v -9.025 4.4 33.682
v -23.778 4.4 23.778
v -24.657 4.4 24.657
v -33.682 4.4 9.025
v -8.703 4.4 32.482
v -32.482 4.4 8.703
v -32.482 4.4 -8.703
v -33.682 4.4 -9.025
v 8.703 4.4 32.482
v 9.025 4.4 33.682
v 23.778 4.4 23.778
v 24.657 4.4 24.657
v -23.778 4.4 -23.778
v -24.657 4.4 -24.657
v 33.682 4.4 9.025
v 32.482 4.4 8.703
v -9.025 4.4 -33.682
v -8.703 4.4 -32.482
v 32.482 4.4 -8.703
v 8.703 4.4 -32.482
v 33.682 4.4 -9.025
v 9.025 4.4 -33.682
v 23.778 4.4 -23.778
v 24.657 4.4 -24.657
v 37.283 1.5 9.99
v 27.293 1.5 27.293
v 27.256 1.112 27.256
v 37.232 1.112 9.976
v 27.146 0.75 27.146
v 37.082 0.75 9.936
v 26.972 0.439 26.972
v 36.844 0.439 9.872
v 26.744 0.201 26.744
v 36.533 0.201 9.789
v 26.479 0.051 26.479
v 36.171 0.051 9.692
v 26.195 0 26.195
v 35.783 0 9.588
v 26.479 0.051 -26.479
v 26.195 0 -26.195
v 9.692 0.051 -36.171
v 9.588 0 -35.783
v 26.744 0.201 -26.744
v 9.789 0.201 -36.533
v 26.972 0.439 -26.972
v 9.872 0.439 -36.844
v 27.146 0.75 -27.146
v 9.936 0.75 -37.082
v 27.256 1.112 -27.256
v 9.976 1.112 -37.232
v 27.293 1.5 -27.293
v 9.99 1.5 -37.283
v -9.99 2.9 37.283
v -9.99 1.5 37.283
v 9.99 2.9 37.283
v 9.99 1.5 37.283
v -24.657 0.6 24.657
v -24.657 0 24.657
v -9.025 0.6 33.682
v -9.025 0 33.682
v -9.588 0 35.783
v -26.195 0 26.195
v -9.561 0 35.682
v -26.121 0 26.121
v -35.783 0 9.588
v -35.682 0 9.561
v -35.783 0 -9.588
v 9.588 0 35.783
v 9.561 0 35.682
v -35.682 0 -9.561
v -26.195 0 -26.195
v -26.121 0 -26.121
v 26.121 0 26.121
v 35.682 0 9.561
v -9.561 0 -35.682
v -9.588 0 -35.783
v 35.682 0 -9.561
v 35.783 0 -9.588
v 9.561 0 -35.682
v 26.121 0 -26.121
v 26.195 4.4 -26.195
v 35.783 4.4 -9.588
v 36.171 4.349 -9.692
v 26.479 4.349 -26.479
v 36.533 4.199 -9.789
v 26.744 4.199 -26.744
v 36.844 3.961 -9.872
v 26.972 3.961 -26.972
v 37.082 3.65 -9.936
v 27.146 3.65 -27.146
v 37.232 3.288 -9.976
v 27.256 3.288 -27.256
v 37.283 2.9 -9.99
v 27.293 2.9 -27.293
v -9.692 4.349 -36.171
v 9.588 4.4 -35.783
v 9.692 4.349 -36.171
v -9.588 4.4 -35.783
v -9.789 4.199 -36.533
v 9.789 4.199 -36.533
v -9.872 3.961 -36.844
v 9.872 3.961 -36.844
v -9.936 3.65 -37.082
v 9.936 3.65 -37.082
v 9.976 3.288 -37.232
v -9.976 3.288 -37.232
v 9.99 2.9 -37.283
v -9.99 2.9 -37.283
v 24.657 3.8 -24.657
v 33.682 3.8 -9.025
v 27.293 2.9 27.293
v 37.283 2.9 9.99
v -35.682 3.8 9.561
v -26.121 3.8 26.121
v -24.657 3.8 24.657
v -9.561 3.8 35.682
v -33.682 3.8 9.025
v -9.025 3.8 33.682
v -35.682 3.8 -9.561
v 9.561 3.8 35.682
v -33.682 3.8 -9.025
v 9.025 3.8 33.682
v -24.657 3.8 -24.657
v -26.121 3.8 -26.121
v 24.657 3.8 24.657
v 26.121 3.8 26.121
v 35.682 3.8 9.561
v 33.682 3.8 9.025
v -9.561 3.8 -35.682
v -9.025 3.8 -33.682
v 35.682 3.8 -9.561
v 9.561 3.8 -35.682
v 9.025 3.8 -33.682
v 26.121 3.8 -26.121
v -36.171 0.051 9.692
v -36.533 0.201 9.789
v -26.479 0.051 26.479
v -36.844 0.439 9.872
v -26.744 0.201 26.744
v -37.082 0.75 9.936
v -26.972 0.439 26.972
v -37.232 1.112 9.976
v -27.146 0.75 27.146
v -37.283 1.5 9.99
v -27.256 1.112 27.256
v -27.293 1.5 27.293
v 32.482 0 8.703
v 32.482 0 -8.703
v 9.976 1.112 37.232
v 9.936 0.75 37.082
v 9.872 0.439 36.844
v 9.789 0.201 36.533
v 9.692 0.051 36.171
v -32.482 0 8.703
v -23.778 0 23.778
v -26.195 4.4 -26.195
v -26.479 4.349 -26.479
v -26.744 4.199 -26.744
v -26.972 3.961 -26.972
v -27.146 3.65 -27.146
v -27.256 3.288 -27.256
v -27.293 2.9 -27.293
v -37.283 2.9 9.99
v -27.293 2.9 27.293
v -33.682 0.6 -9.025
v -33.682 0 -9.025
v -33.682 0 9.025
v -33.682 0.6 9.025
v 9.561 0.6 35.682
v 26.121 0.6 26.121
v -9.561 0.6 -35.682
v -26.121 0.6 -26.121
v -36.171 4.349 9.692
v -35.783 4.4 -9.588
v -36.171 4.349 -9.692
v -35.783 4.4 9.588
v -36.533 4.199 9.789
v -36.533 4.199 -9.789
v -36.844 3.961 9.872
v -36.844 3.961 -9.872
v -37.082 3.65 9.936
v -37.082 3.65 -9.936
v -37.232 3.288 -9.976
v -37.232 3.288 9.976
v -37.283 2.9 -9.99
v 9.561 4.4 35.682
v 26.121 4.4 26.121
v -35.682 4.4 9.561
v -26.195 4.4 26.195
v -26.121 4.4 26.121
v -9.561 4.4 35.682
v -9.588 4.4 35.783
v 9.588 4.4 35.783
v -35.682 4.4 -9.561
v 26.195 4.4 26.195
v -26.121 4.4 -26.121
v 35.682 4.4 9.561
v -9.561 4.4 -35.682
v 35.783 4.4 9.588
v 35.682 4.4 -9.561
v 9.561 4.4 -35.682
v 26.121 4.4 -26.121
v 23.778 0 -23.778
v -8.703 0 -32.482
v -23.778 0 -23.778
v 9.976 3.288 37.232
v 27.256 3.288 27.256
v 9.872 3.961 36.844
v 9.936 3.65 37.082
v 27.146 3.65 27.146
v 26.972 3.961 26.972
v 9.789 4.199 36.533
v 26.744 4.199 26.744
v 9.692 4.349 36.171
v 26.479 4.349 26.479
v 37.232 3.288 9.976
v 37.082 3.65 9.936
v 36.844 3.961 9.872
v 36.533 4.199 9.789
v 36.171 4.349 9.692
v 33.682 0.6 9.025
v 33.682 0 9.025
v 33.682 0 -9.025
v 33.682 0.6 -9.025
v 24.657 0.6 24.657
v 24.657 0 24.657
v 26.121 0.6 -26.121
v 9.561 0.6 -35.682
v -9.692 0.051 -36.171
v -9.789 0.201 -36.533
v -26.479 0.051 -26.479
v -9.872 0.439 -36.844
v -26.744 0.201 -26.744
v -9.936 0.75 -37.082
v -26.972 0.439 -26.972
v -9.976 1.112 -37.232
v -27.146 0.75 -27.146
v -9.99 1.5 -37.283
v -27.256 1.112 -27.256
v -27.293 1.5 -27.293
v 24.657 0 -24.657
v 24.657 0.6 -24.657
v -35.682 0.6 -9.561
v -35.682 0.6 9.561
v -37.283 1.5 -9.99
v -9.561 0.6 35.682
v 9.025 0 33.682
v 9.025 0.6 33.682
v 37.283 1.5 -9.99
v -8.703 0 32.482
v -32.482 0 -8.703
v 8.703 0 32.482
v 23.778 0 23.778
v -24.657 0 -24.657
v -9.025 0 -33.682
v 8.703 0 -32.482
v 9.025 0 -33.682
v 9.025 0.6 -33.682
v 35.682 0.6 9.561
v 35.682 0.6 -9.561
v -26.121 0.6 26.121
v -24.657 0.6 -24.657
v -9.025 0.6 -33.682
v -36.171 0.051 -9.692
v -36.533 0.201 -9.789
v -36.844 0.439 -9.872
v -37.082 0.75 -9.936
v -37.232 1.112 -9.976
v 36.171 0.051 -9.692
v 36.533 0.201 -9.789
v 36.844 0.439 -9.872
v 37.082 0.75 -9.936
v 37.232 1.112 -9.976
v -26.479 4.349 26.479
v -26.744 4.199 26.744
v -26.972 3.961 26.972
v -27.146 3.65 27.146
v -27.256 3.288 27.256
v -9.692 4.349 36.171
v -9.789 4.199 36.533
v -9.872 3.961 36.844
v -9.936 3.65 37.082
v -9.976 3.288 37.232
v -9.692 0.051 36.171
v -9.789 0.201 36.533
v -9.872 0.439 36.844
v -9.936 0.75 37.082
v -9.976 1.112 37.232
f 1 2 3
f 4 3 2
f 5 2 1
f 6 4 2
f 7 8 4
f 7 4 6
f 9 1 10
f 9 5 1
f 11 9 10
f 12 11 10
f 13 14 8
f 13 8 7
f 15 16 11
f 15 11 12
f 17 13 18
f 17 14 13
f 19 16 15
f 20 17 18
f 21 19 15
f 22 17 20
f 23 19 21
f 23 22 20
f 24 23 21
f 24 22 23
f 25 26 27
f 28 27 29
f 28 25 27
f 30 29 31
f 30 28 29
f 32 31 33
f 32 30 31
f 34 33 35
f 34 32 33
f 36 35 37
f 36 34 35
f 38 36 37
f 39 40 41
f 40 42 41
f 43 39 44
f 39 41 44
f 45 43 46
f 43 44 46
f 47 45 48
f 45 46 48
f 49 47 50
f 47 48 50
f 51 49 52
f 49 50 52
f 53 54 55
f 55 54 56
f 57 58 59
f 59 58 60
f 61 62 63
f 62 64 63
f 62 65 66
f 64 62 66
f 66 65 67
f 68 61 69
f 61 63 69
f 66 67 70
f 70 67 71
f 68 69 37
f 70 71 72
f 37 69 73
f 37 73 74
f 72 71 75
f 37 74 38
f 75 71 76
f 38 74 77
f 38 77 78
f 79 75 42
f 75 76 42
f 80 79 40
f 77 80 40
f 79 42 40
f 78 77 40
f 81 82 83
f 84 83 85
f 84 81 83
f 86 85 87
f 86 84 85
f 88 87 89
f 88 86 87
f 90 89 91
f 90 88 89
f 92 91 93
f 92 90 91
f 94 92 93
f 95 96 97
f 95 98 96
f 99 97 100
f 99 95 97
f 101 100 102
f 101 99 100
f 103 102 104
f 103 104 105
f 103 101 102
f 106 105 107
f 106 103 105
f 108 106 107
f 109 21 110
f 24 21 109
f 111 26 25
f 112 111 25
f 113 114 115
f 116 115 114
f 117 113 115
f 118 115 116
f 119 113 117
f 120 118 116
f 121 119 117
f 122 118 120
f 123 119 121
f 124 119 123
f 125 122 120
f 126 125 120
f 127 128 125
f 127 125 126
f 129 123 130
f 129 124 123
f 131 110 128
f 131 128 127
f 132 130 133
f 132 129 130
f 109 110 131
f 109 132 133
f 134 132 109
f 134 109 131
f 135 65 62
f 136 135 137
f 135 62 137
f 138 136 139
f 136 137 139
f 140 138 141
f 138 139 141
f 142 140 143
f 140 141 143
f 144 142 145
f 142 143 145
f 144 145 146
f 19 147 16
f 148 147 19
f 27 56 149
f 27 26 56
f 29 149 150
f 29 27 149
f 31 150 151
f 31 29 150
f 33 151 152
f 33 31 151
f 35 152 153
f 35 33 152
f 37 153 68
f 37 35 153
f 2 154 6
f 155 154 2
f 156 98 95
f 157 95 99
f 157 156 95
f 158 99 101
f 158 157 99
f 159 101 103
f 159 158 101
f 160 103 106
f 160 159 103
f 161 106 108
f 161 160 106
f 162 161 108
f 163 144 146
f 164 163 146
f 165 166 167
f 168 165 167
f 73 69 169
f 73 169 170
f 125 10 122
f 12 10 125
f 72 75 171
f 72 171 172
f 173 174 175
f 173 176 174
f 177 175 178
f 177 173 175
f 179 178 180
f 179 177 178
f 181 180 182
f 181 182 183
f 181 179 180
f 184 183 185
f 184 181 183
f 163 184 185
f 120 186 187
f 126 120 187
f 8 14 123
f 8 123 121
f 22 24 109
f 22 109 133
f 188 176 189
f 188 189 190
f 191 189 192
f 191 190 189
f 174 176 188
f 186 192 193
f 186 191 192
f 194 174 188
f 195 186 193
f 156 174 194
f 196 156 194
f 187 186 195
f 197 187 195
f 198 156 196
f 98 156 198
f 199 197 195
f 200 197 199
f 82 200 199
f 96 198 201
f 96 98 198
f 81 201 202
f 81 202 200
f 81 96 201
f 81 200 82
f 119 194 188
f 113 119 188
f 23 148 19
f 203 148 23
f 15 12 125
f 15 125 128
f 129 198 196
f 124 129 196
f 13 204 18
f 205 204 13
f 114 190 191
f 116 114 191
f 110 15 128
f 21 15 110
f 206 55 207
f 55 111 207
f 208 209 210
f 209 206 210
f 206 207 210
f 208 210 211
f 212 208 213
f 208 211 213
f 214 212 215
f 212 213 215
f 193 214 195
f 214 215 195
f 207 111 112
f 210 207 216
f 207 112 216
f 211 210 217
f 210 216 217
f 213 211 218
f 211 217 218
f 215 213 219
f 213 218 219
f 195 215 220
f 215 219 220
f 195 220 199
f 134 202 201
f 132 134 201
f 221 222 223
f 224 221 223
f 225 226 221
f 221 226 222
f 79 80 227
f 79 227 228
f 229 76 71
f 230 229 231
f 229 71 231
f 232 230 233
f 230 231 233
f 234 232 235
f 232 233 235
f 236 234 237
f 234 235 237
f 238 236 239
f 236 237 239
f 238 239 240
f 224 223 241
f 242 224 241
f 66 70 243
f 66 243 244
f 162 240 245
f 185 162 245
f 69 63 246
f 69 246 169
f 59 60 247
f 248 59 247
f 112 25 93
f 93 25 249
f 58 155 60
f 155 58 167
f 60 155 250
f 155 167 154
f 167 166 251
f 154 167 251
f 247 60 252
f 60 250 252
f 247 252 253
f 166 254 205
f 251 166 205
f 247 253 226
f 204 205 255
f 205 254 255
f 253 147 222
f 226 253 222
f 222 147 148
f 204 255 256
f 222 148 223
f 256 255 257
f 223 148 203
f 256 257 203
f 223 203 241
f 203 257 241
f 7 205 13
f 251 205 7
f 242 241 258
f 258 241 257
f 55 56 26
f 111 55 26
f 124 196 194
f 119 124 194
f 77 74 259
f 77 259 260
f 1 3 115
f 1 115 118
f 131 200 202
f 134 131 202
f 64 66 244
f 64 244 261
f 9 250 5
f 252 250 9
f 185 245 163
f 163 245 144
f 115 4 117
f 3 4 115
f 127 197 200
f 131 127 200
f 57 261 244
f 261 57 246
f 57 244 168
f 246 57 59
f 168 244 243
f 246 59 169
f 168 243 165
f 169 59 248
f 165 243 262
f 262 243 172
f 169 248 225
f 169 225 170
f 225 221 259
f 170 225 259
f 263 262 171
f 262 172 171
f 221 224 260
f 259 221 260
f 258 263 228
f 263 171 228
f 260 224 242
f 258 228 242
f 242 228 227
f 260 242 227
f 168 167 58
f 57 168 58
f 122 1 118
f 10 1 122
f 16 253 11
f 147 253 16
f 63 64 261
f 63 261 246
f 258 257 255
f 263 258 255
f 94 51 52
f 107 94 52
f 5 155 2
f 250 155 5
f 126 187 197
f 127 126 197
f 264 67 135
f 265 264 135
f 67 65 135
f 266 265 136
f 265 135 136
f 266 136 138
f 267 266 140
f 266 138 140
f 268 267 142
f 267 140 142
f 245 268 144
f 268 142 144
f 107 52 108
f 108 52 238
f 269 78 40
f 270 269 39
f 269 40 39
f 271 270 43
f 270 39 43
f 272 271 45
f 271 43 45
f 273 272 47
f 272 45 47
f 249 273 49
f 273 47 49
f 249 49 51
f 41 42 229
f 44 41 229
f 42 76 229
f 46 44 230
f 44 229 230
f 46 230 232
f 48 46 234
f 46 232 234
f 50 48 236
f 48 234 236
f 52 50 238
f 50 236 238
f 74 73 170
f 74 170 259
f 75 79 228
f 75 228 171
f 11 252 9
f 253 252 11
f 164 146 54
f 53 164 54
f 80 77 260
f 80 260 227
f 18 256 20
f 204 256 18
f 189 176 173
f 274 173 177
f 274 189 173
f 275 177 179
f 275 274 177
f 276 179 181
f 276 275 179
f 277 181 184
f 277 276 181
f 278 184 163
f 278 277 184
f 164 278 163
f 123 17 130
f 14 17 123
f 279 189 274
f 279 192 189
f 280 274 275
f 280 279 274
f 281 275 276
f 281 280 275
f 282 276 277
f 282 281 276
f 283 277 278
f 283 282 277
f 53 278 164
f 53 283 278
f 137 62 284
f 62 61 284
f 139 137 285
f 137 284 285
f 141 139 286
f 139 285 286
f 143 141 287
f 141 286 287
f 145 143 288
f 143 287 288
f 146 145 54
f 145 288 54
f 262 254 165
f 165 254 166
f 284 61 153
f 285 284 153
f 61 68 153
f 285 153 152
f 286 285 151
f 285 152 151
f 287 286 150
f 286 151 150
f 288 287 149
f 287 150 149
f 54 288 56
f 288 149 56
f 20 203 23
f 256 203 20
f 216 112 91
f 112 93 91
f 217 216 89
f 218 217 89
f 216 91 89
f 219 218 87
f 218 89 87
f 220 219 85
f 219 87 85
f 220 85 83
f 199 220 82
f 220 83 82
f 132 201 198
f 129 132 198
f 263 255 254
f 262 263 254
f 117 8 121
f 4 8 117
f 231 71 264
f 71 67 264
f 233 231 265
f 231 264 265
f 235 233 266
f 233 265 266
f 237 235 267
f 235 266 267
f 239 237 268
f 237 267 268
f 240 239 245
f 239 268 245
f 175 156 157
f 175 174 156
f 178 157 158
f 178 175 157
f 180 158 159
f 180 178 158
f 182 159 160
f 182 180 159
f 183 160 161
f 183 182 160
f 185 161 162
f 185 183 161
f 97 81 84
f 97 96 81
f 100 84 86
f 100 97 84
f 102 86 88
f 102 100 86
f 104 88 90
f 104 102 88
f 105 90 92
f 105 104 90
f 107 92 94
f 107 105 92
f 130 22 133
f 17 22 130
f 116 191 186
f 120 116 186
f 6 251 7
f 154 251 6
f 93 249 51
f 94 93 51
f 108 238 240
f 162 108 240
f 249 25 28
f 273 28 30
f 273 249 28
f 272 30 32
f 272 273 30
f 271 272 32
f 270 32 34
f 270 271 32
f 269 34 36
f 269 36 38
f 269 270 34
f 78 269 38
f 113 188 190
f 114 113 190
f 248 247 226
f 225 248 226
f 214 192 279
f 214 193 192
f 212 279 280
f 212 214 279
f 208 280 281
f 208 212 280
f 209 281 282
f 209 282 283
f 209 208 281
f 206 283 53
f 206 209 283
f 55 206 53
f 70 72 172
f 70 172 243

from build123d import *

# Parameters (mm, degrees)
EXTRUDE_1_DEPTH          = 4.4
CUT_EXTRUDE_1_DEPTH      = 0.6
FILLET_1_R               = 1.5
CUT_EXTRUDE_2_DEPTH      = 53.909660275
CUT_EXTRUDE_2_DEPTH_BACK = 53.909660275


with BuildPart() as part:
    # 스케치1 → 보스-돌출1 (new body)
    with BuildSketch(Plane(origin=(0, 0, 0), x_dir=(1, 0, 0), z_dir=(0, 1, 0))):
        Polygon((27.293187568, -27.293187568), (37.283187568, -9.99), (37.283187568, 9.99), (27.293187568, 27.293187568), (9.99, 37.283187568), (-9.99, 37.283187568), (-27.293187568, 27.293187568), (-37.283187568, 9.99), (-37.283187568, -9.99), (-27.293187568, -27.293187568), (-9.99, -37.283187568), (9.99, -37.283187568), align=None)
    extrude(amount=EXTRUDE_1_DEPTH)

    # 스케치2 → 컷-돌출1 (cut)
    with BuildSketch(Plane(origin=(0, 4.4, 0), x_dir=(1, 0, 0), z_dir=(0, 1, 0))):
        Polygon((-26.120860153, 26.120860153), (-35.681758538, 9.560898385), (-35.681758538, -9.560898385), (-26.120860153, -26.120860153), (-9.560898385, -35.681758538), (9.560898385, -35.681758538), (26.120860153, -26.120860153), (35.681758538, -9.560898385), (35.681758538, 9.560898385), (26.120860153, 26.120860153), (9.560898385, 35.681758538), (-9.560898385, 35.681758538), align=None)
        Polygon((24.656758538, -24.656758538), (33.681758538, -9.025), (33.681758538, 9.025), (24.656758538, 24.656758538), (9.025, 33.681758538), (-9.025, 33.681758538), (-24.656758538, 24.656758538), (-33.681758538, 9.025), (-33.681758538, -9.025), (-24.656758538, -24.656758538), (-9.025, -33.681758538), (9.025, -33.681758538), align=None, mode=Mode.SUBTRACT)
    cut_extrude_1 = extrude(amount=-CUT_EXTRUDE_1_DEPTH, mode=Mode.SUBTRACT)

    # 필렛1
    fillet_1_edges = [part.edges().sort_by_distance(p)[0] for p in [
        (0, 0, 37.283187568),
        (-18.641593784, 0, 32.288187568),
        (37.283187568, 4.4, 0),
        (-32.288187568, 0, 18.641593784),
        (-37.283187568, 0, 0),
        (-32.288187568, 0, -18.641593784),
        (-18.641593784, 0, -32.288187568),
        (0, 0, -37.283187568),
        (18.641593784, 0, -32.288187568),
        (32.288187568, 0, -18.641593784),
        (37.283187568, 0, 0),
        (32.288187568, 0, 18.641593784),
        (18.641593784, 0, 32.288187568),
        (32.288187568, 4.4, -18.641593784),
        (18.641593784, 4.4, -32.288187568),
        (0, 4.4, -37.283187568),
        (-18.641593784, 4.4, -32.288187568),
        (-32.288187568, 4.4, -18.641593784),
        (-37.283187568, 4.4, 0),
        (-32.288187568, 4.4, 18.641593784),
        (-18.641593784, 4.4, 32.288187568),
        (0, 4.4, 37.283187568),
        (18.641593784, 4.4, 32.288187568),
        (32.288187568, 4.4, 18.641593784),
    ]]
    fillet(fillet_1_edges, radius=FILLET_1_R)

    # 스케치3 → 컷-돌출2 (cut, two sides: drawn at the far end of the back side and taken through both)
    with BuildSketch(Plane(origin=(0, 4.4, 0), x_dir=(1, 0, 0), z_dir=(0, 1, 0)).offset(-CUT_EXTRUDE_2_DEPTH_BACK)):
        Polygon((23.778297569, 23.778297569), (8.703460969, 32.481758538), (-8.703460969, 32.481758538), (-23.778297569, 23.778297569), (-32.481758538, 8.703460969), (-32.481758538, -8.703460969), (-23.778297569, -23.778297569), (-8.703460969, -32.481758538), (8.703460969, -32.481758538), (23.778297569, -23.778297569), (32.481758538, -8.703460969), (32.481758538, 8.703460969), align=None)
    extrude(amount=CUT_EXTRUDE_2_DEPTH + CUT_EXTRUDE_2_DEPTH_BACK, mode=Mode.SUBTRACT)

    # 대칭 복사1: 컷-돌출1 across plane
    add(cut_extrude_1.mirror(Plane.ZX.offset(2.2)), mode=Mode.SUBTRACT)


solid = part.part
